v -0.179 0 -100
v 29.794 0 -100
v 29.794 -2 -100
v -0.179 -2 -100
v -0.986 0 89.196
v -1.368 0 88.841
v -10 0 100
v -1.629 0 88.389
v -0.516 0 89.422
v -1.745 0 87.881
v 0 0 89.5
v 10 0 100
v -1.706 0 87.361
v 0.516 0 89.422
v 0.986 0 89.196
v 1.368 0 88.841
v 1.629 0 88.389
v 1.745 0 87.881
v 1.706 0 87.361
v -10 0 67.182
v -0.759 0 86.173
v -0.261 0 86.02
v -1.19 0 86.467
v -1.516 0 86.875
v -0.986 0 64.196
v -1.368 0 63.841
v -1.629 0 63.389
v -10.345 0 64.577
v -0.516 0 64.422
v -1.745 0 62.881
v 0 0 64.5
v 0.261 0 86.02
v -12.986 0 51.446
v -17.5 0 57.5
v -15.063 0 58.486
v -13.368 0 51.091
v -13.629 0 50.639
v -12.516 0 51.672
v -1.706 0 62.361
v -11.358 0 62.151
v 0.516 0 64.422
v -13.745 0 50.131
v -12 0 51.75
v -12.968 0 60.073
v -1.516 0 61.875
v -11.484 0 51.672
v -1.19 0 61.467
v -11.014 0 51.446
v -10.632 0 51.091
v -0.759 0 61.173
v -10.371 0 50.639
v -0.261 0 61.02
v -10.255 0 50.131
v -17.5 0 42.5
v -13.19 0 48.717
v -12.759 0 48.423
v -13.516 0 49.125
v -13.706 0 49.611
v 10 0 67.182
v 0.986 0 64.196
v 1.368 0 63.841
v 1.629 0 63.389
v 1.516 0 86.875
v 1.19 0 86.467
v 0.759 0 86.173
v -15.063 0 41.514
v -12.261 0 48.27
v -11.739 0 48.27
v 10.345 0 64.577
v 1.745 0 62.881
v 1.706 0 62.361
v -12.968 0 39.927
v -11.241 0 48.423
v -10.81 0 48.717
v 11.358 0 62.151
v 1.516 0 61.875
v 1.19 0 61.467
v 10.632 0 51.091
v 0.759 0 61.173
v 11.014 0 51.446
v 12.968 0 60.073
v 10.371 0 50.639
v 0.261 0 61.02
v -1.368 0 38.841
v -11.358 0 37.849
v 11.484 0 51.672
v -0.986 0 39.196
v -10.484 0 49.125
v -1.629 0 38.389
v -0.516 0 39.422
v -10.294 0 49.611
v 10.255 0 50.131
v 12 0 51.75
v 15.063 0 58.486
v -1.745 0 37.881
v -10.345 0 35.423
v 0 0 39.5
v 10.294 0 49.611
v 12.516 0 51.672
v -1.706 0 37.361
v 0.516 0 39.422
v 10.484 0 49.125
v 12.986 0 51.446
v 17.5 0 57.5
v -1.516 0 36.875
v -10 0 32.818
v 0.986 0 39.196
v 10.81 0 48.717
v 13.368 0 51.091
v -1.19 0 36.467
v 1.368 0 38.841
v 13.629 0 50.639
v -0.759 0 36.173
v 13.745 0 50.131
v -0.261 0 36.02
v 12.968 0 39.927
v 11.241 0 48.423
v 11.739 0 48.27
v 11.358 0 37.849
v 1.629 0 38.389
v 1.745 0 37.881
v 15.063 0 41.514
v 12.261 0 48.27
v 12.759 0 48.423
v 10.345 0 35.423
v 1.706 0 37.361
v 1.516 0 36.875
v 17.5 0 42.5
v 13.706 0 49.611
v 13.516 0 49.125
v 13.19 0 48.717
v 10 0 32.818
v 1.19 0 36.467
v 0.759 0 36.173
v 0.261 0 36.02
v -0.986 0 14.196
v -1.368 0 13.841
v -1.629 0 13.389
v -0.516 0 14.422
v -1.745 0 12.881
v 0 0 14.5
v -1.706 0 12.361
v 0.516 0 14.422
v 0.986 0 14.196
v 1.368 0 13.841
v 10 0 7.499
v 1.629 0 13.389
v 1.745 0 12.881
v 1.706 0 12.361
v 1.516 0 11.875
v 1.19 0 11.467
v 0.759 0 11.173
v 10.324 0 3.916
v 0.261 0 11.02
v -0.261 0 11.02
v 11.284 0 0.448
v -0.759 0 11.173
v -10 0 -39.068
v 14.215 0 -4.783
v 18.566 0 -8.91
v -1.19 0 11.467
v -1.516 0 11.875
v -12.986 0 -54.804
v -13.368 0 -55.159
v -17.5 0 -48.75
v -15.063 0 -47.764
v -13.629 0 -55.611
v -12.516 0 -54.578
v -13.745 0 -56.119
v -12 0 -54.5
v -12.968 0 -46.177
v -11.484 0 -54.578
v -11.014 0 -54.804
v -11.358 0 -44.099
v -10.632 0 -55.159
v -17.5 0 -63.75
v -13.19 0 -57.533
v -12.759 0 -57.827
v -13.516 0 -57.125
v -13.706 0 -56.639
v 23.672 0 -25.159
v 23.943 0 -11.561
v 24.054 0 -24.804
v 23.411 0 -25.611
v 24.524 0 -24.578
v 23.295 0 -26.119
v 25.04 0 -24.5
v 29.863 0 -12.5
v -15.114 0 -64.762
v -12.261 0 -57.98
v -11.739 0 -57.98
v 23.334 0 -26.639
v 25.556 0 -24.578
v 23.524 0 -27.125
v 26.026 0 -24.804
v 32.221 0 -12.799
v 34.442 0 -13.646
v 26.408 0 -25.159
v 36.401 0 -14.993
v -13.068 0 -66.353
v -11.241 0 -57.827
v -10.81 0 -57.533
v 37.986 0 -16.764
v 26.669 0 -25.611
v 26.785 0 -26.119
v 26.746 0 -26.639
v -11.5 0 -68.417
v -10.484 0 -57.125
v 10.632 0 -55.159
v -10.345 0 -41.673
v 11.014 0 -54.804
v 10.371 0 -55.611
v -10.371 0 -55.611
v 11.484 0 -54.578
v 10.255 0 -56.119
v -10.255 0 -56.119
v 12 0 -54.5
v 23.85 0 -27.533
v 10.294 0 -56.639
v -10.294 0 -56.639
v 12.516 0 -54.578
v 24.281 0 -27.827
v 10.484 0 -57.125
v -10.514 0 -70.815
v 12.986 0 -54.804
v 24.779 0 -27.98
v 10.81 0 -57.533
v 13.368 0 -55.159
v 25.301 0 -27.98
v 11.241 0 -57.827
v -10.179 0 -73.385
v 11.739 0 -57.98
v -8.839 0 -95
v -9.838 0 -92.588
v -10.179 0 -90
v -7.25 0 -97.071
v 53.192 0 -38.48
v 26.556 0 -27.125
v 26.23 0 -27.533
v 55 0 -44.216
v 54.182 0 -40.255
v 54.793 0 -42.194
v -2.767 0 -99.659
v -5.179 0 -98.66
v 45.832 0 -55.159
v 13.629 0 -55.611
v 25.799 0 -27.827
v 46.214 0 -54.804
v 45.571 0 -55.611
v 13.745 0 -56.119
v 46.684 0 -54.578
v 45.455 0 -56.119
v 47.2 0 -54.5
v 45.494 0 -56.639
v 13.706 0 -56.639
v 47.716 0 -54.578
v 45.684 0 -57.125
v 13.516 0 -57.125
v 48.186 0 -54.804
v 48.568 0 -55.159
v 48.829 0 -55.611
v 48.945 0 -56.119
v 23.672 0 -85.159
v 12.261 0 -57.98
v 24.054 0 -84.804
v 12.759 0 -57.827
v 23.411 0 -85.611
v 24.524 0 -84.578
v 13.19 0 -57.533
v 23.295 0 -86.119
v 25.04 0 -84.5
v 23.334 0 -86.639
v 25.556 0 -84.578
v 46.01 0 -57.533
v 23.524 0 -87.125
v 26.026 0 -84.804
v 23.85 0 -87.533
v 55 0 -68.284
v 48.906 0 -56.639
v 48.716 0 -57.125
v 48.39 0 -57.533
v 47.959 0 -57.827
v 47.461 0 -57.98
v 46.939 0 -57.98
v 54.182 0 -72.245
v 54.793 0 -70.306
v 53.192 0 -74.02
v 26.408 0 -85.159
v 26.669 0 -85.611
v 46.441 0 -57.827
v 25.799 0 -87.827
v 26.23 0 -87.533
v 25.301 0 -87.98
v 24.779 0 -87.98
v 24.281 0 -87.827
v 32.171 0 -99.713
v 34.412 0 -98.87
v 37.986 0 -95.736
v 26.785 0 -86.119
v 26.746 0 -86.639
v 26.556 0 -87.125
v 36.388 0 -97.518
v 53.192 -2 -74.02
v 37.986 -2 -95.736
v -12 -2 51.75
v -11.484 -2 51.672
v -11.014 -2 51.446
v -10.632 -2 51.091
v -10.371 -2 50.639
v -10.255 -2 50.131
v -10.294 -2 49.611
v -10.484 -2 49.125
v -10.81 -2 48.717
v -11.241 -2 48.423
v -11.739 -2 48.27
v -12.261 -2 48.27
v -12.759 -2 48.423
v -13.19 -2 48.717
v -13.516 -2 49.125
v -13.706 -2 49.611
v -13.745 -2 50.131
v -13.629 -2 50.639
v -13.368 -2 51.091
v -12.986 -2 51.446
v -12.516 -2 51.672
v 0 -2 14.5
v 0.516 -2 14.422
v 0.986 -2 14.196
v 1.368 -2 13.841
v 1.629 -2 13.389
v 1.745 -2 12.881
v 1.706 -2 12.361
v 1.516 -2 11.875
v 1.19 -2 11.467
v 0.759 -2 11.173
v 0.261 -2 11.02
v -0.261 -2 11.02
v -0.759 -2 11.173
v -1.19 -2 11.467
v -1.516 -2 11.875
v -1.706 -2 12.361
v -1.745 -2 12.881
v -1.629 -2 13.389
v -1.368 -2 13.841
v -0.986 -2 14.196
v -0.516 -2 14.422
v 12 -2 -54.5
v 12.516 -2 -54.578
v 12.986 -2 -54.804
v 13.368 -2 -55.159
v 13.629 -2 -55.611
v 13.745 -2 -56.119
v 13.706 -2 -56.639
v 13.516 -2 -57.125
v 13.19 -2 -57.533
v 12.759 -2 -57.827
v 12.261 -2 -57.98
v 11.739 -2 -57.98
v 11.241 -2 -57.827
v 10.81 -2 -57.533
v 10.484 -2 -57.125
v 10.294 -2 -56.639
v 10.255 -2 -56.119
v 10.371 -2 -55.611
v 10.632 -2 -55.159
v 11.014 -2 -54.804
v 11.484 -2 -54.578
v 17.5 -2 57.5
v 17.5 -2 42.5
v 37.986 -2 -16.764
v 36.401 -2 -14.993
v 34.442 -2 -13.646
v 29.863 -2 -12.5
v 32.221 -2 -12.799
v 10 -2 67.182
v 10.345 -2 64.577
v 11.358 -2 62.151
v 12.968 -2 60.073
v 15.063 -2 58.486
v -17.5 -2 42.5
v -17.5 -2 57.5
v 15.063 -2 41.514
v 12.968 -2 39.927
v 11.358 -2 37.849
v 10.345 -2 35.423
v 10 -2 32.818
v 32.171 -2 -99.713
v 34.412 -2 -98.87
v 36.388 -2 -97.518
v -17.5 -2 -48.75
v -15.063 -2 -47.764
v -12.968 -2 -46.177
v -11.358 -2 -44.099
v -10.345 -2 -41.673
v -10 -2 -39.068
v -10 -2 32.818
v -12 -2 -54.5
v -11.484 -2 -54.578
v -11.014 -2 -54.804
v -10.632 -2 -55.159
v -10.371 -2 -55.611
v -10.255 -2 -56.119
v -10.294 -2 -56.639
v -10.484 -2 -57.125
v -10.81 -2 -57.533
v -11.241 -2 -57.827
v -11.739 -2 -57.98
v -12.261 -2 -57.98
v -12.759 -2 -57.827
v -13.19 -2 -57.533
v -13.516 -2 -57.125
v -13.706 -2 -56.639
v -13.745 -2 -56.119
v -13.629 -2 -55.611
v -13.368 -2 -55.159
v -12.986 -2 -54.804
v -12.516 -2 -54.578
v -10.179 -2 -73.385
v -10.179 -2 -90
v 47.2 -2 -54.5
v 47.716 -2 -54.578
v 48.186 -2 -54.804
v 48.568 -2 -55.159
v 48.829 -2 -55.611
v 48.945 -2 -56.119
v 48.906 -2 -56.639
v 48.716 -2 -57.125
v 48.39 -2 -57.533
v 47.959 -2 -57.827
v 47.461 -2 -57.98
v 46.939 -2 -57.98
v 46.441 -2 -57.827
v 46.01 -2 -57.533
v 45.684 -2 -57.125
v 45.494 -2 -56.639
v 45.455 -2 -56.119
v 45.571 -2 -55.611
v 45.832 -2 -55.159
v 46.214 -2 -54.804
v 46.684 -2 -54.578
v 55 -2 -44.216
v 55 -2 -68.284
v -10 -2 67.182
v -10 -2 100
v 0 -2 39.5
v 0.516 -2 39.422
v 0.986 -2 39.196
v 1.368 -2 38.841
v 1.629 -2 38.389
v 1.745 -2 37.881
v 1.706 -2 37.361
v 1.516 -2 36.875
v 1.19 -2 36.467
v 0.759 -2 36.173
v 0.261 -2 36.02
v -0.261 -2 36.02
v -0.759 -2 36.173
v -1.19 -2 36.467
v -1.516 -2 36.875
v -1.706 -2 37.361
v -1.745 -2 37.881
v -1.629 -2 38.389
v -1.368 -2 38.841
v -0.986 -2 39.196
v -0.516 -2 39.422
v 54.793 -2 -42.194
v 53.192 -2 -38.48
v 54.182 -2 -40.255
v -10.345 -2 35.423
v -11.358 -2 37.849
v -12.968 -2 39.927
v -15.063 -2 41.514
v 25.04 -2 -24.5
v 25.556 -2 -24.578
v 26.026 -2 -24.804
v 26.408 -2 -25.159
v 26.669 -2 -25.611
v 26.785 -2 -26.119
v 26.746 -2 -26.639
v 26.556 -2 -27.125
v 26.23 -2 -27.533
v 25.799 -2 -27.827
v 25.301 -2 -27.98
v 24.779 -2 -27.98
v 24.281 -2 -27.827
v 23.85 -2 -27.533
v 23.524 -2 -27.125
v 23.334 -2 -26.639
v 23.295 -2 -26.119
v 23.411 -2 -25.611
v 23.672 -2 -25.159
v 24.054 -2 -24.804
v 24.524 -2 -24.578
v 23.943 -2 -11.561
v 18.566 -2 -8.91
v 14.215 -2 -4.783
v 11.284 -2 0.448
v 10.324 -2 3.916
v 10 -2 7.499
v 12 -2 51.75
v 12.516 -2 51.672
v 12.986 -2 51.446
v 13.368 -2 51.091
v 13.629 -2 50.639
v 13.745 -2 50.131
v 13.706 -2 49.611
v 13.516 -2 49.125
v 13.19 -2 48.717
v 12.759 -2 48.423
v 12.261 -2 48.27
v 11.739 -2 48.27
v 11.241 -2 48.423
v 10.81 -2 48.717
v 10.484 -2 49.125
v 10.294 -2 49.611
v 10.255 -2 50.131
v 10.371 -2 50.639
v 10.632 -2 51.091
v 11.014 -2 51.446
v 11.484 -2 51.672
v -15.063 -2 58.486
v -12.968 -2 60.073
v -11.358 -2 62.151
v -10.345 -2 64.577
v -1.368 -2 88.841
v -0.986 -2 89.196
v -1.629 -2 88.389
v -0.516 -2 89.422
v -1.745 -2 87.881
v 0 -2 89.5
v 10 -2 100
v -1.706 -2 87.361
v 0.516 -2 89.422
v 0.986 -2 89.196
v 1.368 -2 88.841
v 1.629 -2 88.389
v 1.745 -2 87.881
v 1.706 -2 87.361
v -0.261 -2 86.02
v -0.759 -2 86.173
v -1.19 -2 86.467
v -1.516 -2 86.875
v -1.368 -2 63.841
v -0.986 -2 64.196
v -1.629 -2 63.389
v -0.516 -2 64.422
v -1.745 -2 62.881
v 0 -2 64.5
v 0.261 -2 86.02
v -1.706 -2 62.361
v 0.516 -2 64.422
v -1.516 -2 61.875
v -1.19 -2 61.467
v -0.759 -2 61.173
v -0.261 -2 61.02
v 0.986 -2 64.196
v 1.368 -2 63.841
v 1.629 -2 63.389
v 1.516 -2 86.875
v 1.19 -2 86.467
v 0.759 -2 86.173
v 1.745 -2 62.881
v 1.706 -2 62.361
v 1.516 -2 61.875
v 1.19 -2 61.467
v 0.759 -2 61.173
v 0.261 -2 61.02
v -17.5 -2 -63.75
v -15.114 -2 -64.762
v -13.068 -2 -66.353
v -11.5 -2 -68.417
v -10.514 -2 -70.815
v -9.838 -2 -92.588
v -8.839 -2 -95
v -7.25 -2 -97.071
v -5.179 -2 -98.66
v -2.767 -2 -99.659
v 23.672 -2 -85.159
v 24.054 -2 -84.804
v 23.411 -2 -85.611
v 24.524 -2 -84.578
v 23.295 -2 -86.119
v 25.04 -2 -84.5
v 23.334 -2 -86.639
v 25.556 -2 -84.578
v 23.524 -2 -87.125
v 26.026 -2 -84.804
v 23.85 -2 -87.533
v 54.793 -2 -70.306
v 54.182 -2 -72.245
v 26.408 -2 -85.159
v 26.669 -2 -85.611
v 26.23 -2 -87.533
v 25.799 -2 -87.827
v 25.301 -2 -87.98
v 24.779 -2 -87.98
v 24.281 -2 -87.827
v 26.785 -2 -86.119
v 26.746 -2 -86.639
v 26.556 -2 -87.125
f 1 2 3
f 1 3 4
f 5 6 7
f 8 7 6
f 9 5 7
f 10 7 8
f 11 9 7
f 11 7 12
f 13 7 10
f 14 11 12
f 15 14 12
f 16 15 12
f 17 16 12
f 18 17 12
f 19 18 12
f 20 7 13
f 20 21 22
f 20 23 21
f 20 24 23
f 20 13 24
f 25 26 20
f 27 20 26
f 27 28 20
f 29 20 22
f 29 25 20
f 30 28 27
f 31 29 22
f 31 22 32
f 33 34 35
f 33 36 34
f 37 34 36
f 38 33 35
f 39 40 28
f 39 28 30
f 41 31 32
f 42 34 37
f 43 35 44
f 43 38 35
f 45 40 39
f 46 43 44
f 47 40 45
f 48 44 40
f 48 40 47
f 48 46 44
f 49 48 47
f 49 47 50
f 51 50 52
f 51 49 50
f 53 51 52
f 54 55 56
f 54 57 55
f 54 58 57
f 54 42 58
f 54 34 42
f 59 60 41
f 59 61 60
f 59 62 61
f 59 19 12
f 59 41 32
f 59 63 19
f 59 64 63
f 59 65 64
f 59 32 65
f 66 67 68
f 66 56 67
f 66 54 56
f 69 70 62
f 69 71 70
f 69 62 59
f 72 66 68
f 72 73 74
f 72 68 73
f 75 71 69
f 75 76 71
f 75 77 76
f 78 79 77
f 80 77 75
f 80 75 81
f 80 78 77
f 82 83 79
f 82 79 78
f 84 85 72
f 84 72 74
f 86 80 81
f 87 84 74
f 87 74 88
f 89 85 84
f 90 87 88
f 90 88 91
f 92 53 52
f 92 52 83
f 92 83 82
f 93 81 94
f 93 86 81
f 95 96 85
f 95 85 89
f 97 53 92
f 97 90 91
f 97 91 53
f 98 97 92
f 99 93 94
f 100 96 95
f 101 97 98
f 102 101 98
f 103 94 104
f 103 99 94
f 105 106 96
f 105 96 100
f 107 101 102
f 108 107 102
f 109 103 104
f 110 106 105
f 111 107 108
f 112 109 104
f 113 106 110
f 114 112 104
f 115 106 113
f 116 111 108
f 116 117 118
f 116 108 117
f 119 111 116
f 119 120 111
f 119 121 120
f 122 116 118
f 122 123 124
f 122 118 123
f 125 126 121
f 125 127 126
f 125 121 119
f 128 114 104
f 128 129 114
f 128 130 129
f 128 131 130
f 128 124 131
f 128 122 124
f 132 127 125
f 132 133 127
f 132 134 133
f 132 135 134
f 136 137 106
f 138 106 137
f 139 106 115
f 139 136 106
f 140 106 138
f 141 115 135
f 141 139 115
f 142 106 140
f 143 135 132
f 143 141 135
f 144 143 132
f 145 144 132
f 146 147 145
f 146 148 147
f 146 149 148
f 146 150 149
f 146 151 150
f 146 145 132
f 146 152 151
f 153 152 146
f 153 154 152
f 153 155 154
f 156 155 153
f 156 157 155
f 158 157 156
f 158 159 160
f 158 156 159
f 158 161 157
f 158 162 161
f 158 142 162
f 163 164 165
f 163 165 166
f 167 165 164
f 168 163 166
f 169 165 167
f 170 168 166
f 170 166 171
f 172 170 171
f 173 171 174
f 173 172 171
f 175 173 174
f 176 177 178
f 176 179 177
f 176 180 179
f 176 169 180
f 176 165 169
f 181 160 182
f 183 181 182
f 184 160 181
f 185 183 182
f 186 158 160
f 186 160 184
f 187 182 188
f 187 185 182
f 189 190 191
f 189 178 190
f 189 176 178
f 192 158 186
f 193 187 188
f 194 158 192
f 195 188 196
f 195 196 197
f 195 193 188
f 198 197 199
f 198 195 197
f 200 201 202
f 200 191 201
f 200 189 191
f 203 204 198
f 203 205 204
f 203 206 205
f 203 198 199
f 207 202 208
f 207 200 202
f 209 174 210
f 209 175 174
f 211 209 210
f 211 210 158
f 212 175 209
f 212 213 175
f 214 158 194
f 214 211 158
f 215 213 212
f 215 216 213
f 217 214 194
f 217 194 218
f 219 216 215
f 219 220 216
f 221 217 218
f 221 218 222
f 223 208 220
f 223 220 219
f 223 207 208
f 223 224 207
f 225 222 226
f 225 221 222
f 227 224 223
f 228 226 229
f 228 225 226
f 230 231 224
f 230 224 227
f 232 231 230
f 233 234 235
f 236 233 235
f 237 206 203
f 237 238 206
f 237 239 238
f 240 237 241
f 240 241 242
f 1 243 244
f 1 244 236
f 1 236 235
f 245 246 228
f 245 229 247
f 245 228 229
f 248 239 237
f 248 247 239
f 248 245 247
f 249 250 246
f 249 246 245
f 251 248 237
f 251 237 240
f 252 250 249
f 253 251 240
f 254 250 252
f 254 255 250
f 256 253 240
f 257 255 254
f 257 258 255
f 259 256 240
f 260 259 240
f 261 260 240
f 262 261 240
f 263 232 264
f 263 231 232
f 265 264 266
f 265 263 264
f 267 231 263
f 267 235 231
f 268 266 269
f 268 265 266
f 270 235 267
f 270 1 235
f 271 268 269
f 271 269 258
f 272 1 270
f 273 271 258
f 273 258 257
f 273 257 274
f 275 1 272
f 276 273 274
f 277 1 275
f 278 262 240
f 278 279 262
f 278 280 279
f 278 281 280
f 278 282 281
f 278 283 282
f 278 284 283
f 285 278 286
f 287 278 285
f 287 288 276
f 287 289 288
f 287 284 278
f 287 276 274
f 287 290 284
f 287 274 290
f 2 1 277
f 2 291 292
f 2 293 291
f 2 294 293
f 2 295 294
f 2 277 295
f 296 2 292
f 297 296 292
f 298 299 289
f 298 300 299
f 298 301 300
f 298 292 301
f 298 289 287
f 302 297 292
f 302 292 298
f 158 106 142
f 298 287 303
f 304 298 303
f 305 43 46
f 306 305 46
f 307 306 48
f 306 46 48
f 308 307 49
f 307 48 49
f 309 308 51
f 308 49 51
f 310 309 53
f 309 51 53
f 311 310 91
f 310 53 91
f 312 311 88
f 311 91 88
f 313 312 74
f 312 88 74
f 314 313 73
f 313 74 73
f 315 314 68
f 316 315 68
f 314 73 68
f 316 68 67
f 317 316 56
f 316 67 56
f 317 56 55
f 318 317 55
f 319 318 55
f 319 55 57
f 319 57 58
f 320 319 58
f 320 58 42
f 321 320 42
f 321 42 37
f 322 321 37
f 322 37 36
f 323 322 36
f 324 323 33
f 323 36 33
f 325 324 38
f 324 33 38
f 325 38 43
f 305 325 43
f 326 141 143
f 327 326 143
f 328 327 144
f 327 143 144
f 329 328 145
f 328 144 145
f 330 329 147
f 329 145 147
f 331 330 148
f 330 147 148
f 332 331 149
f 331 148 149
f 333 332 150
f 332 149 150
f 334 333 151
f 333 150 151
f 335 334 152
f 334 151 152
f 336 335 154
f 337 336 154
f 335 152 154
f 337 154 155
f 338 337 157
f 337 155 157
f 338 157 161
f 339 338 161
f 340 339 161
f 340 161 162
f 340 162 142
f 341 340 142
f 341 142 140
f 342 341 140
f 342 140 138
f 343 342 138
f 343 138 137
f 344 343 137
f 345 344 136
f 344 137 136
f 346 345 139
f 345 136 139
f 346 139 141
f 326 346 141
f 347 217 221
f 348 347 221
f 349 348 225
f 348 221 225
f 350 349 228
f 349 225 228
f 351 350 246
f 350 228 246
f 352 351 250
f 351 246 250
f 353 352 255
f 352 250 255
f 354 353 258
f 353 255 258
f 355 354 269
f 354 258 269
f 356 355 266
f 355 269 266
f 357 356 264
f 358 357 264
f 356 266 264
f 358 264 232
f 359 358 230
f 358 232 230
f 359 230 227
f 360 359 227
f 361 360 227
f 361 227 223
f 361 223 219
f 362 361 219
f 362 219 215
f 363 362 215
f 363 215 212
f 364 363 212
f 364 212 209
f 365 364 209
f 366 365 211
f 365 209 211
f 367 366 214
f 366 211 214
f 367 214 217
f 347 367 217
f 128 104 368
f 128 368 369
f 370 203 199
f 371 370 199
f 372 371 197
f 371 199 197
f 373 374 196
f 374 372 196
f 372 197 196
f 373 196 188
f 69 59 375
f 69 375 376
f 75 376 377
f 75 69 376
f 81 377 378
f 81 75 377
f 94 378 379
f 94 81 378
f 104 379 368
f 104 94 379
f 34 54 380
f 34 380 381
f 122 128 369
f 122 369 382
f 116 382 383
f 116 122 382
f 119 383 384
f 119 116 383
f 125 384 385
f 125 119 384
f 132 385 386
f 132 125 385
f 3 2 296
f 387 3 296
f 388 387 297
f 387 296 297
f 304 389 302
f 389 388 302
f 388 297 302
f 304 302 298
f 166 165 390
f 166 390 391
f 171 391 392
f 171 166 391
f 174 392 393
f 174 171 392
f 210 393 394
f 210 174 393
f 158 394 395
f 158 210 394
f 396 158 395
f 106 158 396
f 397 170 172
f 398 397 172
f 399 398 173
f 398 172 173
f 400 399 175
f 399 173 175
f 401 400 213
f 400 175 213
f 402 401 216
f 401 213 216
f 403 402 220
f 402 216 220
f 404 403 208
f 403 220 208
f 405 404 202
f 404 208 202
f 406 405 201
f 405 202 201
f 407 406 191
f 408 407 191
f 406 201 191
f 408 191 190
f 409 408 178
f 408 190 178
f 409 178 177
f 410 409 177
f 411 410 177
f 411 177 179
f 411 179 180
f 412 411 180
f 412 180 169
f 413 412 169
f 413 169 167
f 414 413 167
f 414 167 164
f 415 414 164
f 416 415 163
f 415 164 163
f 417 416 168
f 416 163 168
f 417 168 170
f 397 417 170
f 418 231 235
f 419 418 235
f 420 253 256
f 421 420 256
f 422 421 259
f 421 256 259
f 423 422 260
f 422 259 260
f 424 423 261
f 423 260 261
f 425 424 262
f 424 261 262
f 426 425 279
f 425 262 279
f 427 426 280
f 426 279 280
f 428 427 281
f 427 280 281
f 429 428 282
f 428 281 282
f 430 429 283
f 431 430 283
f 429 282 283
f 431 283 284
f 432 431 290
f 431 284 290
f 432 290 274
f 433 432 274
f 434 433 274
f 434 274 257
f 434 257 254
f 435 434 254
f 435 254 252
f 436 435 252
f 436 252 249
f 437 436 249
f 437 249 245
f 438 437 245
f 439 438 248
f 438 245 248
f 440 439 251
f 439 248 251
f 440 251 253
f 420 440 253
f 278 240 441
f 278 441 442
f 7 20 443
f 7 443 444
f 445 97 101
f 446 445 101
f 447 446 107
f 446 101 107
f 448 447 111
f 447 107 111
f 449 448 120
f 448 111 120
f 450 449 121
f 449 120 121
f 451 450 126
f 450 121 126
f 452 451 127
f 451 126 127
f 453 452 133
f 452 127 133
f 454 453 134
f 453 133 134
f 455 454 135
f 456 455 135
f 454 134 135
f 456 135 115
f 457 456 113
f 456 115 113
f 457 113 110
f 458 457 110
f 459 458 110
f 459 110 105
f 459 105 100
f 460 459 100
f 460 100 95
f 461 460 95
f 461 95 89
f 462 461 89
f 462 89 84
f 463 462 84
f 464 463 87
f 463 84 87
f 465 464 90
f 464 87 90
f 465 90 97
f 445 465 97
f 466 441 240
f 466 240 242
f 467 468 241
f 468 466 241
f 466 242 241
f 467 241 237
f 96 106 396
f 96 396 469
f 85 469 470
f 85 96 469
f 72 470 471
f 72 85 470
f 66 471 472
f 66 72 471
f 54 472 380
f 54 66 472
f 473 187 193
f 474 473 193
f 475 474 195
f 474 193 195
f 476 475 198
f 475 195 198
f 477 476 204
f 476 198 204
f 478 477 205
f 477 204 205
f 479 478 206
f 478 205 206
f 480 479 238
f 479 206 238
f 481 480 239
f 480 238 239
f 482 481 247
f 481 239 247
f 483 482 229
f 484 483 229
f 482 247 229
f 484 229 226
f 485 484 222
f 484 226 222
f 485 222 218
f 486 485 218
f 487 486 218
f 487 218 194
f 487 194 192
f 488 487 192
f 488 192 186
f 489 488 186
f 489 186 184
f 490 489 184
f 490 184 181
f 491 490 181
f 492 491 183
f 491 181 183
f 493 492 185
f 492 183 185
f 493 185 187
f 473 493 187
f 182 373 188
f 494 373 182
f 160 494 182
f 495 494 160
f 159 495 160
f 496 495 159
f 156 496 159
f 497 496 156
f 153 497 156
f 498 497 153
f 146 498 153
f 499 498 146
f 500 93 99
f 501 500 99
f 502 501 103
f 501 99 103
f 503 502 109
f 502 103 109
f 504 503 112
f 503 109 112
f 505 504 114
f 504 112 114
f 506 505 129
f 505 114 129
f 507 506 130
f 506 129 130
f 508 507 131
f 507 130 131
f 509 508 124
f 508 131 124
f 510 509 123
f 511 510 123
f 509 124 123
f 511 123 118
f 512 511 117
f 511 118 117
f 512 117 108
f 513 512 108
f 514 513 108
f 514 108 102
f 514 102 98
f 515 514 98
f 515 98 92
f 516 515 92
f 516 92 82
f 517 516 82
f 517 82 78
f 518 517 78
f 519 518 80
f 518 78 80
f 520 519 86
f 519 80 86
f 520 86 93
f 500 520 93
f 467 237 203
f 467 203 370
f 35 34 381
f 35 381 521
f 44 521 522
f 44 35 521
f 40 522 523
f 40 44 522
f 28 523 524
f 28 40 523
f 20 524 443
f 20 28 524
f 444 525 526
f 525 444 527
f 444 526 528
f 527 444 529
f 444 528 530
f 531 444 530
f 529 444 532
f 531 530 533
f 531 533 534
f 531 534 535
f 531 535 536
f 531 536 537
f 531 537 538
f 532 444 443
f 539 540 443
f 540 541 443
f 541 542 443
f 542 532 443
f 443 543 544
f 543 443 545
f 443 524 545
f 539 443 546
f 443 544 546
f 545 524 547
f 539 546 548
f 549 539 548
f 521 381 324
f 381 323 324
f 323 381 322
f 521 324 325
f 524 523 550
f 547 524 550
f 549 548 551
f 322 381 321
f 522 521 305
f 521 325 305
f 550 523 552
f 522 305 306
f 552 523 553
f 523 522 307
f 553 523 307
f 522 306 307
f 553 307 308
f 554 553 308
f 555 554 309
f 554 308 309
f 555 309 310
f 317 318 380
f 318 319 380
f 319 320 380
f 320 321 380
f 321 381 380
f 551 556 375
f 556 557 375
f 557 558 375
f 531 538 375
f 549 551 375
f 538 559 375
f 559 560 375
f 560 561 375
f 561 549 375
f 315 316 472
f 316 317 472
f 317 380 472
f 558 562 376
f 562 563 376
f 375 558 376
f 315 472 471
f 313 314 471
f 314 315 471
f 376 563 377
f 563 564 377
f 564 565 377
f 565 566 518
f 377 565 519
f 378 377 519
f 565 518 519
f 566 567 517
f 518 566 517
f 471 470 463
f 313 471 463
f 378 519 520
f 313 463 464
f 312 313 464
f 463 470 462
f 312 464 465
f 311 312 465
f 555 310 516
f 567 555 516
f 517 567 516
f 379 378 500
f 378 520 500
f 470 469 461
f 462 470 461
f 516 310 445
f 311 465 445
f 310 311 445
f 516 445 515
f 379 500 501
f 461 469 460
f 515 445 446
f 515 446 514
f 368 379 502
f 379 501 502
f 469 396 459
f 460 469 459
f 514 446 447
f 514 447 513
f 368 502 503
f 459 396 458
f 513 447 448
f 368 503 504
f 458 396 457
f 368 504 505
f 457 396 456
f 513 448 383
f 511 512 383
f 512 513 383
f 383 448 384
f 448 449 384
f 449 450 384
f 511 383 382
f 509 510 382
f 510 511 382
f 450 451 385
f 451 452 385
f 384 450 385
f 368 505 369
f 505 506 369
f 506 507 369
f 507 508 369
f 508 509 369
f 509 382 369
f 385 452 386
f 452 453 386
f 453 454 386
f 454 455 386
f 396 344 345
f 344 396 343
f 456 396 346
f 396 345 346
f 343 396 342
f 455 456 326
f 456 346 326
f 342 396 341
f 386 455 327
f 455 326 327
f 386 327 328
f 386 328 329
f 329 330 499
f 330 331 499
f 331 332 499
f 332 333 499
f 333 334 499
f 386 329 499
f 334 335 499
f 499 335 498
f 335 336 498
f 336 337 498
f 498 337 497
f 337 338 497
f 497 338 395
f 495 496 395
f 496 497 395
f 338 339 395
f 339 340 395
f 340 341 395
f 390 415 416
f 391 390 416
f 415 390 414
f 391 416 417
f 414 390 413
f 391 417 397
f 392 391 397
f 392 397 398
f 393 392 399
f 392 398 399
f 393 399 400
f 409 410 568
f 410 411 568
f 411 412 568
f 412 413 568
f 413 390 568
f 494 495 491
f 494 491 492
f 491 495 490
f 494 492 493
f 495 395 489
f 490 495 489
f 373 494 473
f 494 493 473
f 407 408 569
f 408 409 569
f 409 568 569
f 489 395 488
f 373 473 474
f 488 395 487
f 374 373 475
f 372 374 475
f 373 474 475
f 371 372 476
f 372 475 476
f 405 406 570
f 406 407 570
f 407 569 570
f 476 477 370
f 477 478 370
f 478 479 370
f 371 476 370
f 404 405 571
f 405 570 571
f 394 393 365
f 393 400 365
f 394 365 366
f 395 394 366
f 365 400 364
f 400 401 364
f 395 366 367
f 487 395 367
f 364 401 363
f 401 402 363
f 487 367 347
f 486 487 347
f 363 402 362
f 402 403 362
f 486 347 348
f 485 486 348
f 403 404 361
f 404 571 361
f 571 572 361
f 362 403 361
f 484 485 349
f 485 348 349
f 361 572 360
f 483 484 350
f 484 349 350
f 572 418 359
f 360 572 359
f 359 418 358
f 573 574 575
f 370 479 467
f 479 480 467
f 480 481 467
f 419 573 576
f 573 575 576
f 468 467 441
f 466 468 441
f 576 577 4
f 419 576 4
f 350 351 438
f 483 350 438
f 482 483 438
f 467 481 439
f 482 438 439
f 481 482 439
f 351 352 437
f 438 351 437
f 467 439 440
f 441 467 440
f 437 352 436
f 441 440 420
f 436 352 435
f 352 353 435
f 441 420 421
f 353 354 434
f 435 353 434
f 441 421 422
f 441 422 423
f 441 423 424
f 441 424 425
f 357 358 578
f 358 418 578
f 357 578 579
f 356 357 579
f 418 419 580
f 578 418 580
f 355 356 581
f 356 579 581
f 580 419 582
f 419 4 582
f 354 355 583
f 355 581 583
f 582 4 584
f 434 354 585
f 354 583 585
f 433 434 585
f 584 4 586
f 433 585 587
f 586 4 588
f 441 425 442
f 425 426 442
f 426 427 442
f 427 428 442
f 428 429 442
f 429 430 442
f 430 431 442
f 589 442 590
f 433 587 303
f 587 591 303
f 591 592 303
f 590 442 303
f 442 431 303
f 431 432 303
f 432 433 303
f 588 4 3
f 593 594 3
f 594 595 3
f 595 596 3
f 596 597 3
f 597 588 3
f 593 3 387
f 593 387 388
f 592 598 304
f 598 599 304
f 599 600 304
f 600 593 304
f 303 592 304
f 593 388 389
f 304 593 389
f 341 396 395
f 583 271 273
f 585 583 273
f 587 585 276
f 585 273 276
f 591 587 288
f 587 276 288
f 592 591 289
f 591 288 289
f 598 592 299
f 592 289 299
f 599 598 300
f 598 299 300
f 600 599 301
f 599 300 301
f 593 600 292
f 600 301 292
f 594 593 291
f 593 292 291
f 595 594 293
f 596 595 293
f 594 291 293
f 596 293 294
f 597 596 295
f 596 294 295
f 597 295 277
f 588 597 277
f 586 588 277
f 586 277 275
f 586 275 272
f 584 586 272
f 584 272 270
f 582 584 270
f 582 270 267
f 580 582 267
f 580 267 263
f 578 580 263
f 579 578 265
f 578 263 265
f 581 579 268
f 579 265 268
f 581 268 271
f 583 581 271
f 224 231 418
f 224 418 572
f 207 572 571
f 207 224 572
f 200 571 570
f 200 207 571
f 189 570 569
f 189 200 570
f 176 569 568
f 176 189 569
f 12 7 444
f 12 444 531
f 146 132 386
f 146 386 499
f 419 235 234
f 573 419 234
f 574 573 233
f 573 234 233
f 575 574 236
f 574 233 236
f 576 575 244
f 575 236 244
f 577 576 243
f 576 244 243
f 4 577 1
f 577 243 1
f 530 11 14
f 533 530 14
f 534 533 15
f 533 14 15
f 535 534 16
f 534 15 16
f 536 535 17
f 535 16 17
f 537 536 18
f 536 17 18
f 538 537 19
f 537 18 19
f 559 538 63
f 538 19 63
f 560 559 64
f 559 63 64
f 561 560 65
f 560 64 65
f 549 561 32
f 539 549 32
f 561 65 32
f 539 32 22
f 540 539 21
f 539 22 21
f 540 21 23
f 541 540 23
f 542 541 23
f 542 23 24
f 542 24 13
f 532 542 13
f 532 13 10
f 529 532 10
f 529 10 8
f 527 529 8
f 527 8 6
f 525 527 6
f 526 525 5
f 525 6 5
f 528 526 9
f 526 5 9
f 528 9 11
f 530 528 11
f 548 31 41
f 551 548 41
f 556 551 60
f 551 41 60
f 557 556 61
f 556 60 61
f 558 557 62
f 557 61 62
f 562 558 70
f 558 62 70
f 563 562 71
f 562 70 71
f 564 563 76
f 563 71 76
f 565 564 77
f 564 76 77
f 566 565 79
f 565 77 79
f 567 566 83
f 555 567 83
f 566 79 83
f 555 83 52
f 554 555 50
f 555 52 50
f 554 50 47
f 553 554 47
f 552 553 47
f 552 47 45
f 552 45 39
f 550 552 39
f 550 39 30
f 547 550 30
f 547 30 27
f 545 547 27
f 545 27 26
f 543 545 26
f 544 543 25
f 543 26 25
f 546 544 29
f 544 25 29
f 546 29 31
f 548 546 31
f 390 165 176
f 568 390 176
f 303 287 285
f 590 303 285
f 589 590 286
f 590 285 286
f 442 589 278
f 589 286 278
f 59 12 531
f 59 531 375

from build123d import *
from OCP.BRepFilletAPI import BRepFilletAPI_MakeChamfer

# Parameters (mm, degrees)
SCHIZZO1_R                   = 1.75
ESTRUSIONE_ESTRUSIONE1_DEPTH = 2
SMUSSO1_SIZE                 = 20
SMUSSO1_SIZE2                = 28.562960135
TAGLIO_ESTRUSIONE1_DEPTH     = 10
RACCORDO1_R                  = 10
RACCORDO2_R                  = 20


with BuildPart() as part:
    # Schizzo1 → Estrusione-Estrusione1 (new body)
    with BuildSketch(Plane(origin=(0, 0, 0), x_dir=(1, 0, 0), z_dir=(0, 1, 0))):
        Polygon((-10, -57.5), (-10, -100), (10, -100), (10, -57.5), (17.5, -57.5), (17.5, -42.5), (10, -42.5), (10, 12.5), (55, 12.5), (55, 100), (10, 100), (-10, 100), (-30, 100), (-30, 12.5), (-10, 12.5), (-10, -42.5), (-17.5, -42.5), (-17.5, -57.5), align=None)
        with Locations(Location((0, -87.75, 0), (0, 0, 270))):
            Circle(SCHIZZO1_R, mode=Mode.SUBTRACT)
        with Locations(Location((0, -62.75, 0), (0, 0, 270))):
            Circle(SCHIZZO1_R, mode=Mode.SUBTRACT)
        with Locations(Location((-12, -50, 0), (0, 0, 270))):
            Circle(SCHIZZO1_R, mode=Mode.SUBTRACT)
        with Locations(Location((0, -37.75, 0), (0, 0, 270))):
            Circle(SCHIZZO1_R, mode=Mode.SUBTRACT)
        with Locations(Location((12, -50, 0), (0, 0, 270))):
            Circle(SCHIZZO1_R, mode=Mode.SUBTRACT)
        with Locations(Location((0, -12.75, 0), (0, 0, 270))):
            Circle(SCHIZZO1_R, mode=Mode.SUBTRACT)
        with Locations(Location((-12, 56.25, 0), (0, 0, 270))):
            Circle(SCHIZZO1_R, mode=Mode.SUBTRACT)
        with Locations(Location((12, 56.25, 0), (0, 0, 270))):
            Circle(SCHIZZO1_R, mode=Mode.SUBTRACT)
        with Locations(Location((25.04, 26.25, 0), (0, 0, 270))):
            Circle(SCHIZZO1_R, mode=Mode.SUBTRACT)
        with Locations(Location((25.04, 86.25, 0), (0, 0, 270))):
            Circle(SCHIZZO1_R, mode=Mode.SUBTRACT)
        with Locations(Location((47.2, 56.25, 0), (0, 0, 270))):
            Circle(SCHIZZO1_R, mode=Mode.SUBTRACT)
    extrude(amount=-ESTRUSIONE_ESTRUSIONE1_DEPTH)

    # Smusso1: one chamfer whose edges measure the first distance from different faces: ONE call of the kernel's chamfer builder (chamfer() names one face for all edges)
    smusso1_edges_1 = [part.edges().sort_by_distance(p)[0] for p in [
        (55, -1, -12.5),
    ]]
    smusso1_side_1 = [part.faces().sort_by_distance(p)[0] for p in [
        (32.5, -1, -12.5),
    ]]
    smusso1_edges_2 = [part.edges().sort_by_distance(p)[0] for p in [
        (55, -1, -100),
    ]]
    smusso1_side_2 = [part.faces().sort_by_distance(p)[0] for p in [
        (12.5, -1, -100),
    ]]
    smusso1 = BRepFilletAPI_MakeChamfer(part.part.solid().wrapped)
    for e in smusso1_edges_1:
        smusso1.Add(SMUSSO1_SIZE, SMUSSO1_SIZE2, e.wrapped, smusso1_side_1[0].wrapped)  # the first distance lies on this face
    for e in smusso1_edges_2:
        smusso1.Add(SMUSSO1_SIZE, SMUSSO1_SIZE2, e.wrapped, smusso1_side_2[0].wrapped)  # the first distance lies on this face
    add(Compound.cast(smusso1.Shape()), mode=Mode.REPLACE)

    # Schizzo2 → Taglio-Estrusione1 (cut)
    with BuildSketch(Plane(origin=(0, 0, 0), x_dir=(1, 0, 0), z_dir=(0, 1, 0))):
        Polygon((-10, 12.5), (-10, 48.75), (-17.5, 48.75), (-17.5, 63.75), (-10.178518111, 63.75), (-10.178518111, 100), (-33.809151811, 100), (-33.809151811, 12.5), align=None)
    extrude(amount=-TAGLIO_ESTRUSIONE1_DEPTH, mode=Mode.SUBTRACT)

    # Raccordo1
    # the kernel refuses this fillet: 10 mm, written as the material it adds along each edge
    with BuildSketch(Plane(origin=(10, 0, 42.5), x_dir=(0, 0, -1), z_dir=(0, -1, 0)), Plane(origin=(-10, 0, 57.5), x_dir=(0, 0, 1), z_dir=(0, -1, 0)), Plane(origin=(-10, 0, -48.75), x_dir=(0, 0, 1), z_dir=(0, -1, 0))) as raccordo1_piece_1:
        with BuildLine():
            CenterArc((9.682458366, 10), RACCORDO1_R, 194.477512186, 75.522487814)
            Line((0, 7.5), (0, 0))
            Line((0, 0), (9.682458366, 0))
        make_face()
    extrude(amount=2)
    with BuildSketch(Plane(origin=(-10, 0, 42.5), x_dir=(-1, 0, 0), z_dir=(0, -1, 0)), Plane(origin=(10, 0, 57.5), x_dir=(1, 0, 0), z_dir=(0, -1, 0))) as raccordo1_piece_2:
        with BuildLine():
            CenterArc((10, 9.682458366), RACCORDO1_R, 180, 75.522487814)
            Line((0, 9.682458366), (0, 0))
            Line((0, 0), (7.5, 0))
        make_face()
    extrude(amount=2)
    with BuildSketch(Plane(origin=(-10.178518111, 0, -63.75), x_dir=(-1, 0, 0), z_dir=(0, -1, 0))) as raccordo1_piece_3:
        with BuildLine():
            CenterArc((10, 9.634601223), RACCORDO1_R, 180, 74.463523002)
            Line((0, 9.634601223), (0, 0))
            Line((0, 0), (7.321481889, 0))
        make_face()
    extrude(amount=2)
    # the kernel refuses this fillet: 10 mm, written as the material it takes off along each edge
    with BuildSketch(Plane(origin=(35, 13.014176264, -12.5), x_dir=(-1, 0, 0), z_dir=(0, -1, 0)), Plane(origin=(35, 13.014176264, -100), x_dir=(0.5735764363510455, 0, 0.8191520442889922), z_dir=(0, -1, 0))) as raccordo1_2_piece_1:
        with BuildLine():
            CenterArc((RACCORDO1_R * 0.520567050552, RACCORDO1_R), RACCORDO1_R, 215, 55)
            Line((-RACCORDO1_R * 0.298584993737, RACCORDO1_R * 0.426423563649), (0, 0))
            Line((0, 0), (RACCORDO1_R * 0.520567050552, 0))
        make_face()
    extrude(amount=28.028352528, mode=Mode.SUBTRACT)
    with BuildSketch(Plane(origin=(55, 7.882469722, -41.062960135), x_dir=(-0.5735764363510429, 0, 0.819152044288994), z_dir=(0, -1, 0)), Plane(origin=(55, 7.882469722, -71.437039865), x_dir=(0, 0, 1), z_dir=(0, -1, 0))) as raccordo1_2_piece_2:
        with BuildLine():
            CenterArc((RACCORDO1_R * 0.315298788879, RACCORDO1_R), RACCORDO1_R, 235, 35)
            Line((-RACCORDO1_R * 0.258277647472, RACCORDO1_R * 0.180847955711), (0, 0))
            Line((0, 0), (RACCORDO1_R * 0.315298788879, 0))
        make_face()
    extrude(amount=17.764939444, mode=Mode.SUBTRACT)
    with BuildSketch(Plane(origin=(-10.178518111, 25, -100), x_dir=(1, 0, 0), z_dir=(0, -1, 0))) as raccordo1_2_piece_3:
        with BuildLine():
            CenterArc((RACCORDO1_R, RACCORDO1_R), RACCORDO1_R, 180, 90)
            Line((0, RACCORDO1_R), (0, 0))
            Line((0, 0), (RACCORDO1_R, 0))
        make_face()
    extrude(amount=52, mode=Mode.SUBTRACT)

    # Raccordo2
    raccordo2_edges = [part.edges().sort_by_distance(p)[0] for p in [
        (10, -1, -12.5),
    ]]
    fillet(raccordo2_edges, radius=RACCORDO2_R)


solid = part.part
